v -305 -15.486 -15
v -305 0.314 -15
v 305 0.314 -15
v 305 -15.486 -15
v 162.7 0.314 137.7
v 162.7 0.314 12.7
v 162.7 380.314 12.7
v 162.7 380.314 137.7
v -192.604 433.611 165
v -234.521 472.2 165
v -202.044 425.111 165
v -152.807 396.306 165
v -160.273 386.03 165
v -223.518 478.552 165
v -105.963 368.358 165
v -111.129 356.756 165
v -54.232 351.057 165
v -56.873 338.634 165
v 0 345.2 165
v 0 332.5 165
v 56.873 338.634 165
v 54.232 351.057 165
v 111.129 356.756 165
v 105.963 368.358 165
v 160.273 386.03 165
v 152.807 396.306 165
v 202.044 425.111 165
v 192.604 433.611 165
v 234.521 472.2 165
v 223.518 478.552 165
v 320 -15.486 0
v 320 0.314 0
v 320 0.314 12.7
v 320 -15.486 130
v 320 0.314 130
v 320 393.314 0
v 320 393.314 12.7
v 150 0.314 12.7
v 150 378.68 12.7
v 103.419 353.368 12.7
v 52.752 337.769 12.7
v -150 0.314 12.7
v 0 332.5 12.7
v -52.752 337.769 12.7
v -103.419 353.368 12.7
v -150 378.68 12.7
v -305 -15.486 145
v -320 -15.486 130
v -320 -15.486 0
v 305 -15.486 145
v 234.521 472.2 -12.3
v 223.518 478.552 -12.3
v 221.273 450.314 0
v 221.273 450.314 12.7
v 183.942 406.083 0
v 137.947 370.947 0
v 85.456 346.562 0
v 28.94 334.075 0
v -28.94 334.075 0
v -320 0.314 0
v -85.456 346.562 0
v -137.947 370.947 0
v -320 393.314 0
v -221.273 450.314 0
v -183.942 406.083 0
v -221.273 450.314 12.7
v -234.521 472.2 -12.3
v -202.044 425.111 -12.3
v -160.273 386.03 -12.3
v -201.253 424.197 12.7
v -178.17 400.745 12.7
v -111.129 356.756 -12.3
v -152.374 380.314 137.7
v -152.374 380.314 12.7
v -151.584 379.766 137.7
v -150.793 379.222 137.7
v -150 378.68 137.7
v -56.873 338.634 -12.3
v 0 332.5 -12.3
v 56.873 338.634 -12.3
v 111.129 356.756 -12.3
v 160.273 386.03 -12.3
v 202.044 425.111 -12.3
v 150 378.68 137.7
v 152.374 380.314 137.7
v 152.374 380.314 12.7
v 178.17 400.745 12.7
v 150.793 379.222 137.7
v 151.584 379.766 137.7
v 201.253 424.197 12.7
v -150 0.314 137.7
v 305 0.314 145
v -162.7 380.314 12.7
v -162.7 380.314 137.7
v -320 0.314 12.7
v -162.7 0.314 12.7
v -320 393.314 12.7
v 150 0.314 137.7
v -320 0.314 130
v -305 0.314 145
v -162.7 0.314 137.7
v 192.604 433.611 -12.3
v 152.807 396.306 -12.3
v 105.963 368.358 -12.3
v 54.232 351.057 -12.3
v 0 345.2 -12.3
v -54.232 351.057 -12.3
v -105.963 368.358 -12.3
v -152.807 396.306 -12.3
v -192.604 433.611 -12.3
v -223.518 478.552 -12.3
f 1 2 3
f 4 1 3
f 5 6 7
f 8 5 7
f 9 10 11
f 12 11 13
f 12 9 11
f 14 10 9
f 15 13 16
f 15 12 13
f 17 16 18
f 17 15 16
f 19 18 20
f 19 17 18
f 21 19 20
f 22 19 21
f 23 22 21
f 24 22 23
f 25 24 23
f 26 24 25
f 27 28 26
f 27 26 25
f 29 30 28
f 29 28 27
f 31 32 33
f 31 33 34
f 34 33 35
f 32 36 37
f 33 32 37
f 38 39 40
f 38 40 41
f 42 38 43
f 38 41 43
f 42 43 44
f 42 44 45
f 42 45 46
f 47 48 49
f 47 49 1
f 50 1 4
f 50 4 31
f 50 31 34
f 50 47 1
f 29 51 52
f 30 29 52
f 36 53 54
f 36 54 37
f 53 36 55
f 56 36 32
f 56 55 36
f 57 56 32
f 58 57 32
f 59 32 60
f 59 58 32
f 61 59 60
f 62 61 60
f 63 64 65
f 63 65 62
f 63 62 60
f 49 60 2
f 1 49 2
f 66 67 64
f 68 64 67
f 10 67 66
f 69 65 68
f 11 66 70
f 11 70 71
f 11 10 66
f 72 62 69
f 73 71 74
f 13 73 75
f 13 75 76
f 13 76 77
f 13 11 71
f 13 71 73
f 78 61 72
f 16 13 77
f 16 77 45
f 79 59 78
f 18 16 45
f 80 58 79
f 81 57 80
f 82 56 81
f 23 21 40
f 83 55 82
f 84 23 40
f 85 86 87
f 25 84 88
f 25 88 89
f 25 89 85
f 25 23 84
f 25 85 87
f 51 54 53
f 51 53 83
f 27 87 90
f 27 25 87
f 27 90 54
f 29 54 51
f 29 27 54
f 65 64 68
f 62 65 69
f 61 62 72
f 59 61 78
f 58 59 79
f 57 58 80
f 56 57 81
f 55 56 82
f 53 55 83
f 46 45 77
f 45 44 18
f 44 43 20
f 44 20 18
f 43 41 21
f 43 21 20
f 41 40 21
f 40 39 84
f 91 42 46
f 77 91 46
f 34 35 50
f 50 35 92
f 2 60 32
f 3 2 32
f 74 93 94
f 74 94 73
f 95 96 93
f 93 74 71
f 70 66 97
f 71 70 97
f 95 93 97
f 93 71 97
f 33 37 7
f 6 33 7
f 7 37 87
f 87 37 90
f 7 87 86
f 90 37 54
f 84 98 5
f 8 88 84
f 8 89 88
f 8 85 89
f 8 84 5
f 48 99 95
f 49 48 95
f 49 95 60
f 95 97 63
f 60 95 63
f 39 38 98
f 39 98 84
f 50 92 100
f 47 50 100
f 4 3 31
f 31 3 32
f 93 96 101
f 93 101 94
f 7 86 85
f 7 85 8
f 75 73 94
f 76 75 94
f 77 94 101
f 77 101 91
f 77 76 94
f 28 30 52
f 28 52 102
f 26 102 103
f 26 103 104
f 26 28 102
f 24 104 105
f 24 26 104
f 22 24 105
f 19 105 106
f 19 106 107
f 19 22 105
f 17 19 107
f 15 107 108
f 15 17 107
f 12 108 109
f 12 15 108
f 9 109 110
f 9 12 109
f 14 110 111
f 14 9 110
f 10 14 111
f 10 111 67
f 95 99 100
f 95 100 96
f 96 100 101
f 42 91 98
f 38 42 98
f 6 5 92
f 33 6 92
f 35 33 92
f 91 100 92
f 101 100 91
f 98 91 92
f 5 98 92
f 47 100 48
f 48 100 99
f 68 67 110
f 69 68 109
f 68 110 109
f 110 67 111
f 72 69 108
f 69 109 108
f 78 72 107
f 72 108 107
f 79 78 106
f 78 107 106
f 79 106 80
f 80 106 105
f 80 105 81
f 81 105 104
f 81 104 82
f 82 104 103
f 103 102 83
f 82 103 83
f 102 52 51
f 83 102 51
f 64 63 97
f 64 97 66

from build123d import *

# Parameters (mm, degrees)
BOSS_EXTRUDE1_DEPTH      = 12.7
BOSS_EXTRUDE2_DEPTH      = 152.3
BOSS_EXTRUDE2_DEPTH_BACK = 25
BOSS_EXTRUDE3_DEPTH      = 15.8
SKETCH4_W                = 12.7
SKETCH4_H                = 380
BOSS_EXTRUDE4_DEPTH      = 125


with BuildPart() as part:
    # Sketch1 → Boss-Extrude1 (new body)
    with BuildSketch(Plane.XY):
        with BuildLine():
            Line((320, 0.313790229), (-320, 0.313790229))
            Line((-320, 0.313790229), (-320, 393.313790229))
            Line((-320, 393.313790229), (-221.273103969, 450.313790229))
            ThreePointArc((-221.273103969, 450.313790229), (0, 332.5), (221.273103969, 450.313790229))
            Line((221.273103969, 450.313790229), (320, 393.313790229))
            Line((320, 393.313790229), (320, 0.313790229))
        make_face()
    extrude(amount=BOSS_EXTRUDE1_DEPTH)

    # Sketch2 → Boss-Extrude2 (add, two sides)
    with BuildSketch(Plane.XY.offset(12.7)) as boss_extrude2_sk:
        with BuildLine():
            Line((234.52055347, 472.2), (223.517731773, 478.552482069))
            ThreePointArc((223.517731773, 478.552482069), (0, 345.2), (-223.517731773, 478.552482069))
            Line((-223.517731773, 478.552482069), (-234.52055347, 472.2))
            ThreePointArc((-234.52055347, 472.2), (0, 332.5), (234.52055347, 472.2))
        make_face()
    extrude(amount=BOSS_EXTRUDE2_DEPTH)
    extrude(boss_extrude2_sk.sketch, amount=-BOSS_EXTRUDE2_DEPTH_BACK)

    # Sketch3 → Boss-Extrude3 (add)
    with BuildSketch(Plane.XZ.offset(-0.313790229)):
        Polygon((-305, -15), (305, -15), (320, 0), (320, 130), (305, 145), (-305, 145), (-320, 130), (-320, 0), align=None)
    extrude(amount=BOSS_EXTRUDE3_DEPTH)

    # Sketch4 → Boss-Extrude4 (add)
    with BuildSketch(Plane.XY.offset(12.7)):
        with Locations((-156.35, 190.313790229)):
            Rectangle(SKETCH4_W, SKETCH4_H)
        with Locations((156.35, 190.313790229)):
            Rectangle(SKETCH4_W, SKETCH4_H)
    extrude(amount=BOSS_EXTRUDE4_DEPTH)


solid = part.part
